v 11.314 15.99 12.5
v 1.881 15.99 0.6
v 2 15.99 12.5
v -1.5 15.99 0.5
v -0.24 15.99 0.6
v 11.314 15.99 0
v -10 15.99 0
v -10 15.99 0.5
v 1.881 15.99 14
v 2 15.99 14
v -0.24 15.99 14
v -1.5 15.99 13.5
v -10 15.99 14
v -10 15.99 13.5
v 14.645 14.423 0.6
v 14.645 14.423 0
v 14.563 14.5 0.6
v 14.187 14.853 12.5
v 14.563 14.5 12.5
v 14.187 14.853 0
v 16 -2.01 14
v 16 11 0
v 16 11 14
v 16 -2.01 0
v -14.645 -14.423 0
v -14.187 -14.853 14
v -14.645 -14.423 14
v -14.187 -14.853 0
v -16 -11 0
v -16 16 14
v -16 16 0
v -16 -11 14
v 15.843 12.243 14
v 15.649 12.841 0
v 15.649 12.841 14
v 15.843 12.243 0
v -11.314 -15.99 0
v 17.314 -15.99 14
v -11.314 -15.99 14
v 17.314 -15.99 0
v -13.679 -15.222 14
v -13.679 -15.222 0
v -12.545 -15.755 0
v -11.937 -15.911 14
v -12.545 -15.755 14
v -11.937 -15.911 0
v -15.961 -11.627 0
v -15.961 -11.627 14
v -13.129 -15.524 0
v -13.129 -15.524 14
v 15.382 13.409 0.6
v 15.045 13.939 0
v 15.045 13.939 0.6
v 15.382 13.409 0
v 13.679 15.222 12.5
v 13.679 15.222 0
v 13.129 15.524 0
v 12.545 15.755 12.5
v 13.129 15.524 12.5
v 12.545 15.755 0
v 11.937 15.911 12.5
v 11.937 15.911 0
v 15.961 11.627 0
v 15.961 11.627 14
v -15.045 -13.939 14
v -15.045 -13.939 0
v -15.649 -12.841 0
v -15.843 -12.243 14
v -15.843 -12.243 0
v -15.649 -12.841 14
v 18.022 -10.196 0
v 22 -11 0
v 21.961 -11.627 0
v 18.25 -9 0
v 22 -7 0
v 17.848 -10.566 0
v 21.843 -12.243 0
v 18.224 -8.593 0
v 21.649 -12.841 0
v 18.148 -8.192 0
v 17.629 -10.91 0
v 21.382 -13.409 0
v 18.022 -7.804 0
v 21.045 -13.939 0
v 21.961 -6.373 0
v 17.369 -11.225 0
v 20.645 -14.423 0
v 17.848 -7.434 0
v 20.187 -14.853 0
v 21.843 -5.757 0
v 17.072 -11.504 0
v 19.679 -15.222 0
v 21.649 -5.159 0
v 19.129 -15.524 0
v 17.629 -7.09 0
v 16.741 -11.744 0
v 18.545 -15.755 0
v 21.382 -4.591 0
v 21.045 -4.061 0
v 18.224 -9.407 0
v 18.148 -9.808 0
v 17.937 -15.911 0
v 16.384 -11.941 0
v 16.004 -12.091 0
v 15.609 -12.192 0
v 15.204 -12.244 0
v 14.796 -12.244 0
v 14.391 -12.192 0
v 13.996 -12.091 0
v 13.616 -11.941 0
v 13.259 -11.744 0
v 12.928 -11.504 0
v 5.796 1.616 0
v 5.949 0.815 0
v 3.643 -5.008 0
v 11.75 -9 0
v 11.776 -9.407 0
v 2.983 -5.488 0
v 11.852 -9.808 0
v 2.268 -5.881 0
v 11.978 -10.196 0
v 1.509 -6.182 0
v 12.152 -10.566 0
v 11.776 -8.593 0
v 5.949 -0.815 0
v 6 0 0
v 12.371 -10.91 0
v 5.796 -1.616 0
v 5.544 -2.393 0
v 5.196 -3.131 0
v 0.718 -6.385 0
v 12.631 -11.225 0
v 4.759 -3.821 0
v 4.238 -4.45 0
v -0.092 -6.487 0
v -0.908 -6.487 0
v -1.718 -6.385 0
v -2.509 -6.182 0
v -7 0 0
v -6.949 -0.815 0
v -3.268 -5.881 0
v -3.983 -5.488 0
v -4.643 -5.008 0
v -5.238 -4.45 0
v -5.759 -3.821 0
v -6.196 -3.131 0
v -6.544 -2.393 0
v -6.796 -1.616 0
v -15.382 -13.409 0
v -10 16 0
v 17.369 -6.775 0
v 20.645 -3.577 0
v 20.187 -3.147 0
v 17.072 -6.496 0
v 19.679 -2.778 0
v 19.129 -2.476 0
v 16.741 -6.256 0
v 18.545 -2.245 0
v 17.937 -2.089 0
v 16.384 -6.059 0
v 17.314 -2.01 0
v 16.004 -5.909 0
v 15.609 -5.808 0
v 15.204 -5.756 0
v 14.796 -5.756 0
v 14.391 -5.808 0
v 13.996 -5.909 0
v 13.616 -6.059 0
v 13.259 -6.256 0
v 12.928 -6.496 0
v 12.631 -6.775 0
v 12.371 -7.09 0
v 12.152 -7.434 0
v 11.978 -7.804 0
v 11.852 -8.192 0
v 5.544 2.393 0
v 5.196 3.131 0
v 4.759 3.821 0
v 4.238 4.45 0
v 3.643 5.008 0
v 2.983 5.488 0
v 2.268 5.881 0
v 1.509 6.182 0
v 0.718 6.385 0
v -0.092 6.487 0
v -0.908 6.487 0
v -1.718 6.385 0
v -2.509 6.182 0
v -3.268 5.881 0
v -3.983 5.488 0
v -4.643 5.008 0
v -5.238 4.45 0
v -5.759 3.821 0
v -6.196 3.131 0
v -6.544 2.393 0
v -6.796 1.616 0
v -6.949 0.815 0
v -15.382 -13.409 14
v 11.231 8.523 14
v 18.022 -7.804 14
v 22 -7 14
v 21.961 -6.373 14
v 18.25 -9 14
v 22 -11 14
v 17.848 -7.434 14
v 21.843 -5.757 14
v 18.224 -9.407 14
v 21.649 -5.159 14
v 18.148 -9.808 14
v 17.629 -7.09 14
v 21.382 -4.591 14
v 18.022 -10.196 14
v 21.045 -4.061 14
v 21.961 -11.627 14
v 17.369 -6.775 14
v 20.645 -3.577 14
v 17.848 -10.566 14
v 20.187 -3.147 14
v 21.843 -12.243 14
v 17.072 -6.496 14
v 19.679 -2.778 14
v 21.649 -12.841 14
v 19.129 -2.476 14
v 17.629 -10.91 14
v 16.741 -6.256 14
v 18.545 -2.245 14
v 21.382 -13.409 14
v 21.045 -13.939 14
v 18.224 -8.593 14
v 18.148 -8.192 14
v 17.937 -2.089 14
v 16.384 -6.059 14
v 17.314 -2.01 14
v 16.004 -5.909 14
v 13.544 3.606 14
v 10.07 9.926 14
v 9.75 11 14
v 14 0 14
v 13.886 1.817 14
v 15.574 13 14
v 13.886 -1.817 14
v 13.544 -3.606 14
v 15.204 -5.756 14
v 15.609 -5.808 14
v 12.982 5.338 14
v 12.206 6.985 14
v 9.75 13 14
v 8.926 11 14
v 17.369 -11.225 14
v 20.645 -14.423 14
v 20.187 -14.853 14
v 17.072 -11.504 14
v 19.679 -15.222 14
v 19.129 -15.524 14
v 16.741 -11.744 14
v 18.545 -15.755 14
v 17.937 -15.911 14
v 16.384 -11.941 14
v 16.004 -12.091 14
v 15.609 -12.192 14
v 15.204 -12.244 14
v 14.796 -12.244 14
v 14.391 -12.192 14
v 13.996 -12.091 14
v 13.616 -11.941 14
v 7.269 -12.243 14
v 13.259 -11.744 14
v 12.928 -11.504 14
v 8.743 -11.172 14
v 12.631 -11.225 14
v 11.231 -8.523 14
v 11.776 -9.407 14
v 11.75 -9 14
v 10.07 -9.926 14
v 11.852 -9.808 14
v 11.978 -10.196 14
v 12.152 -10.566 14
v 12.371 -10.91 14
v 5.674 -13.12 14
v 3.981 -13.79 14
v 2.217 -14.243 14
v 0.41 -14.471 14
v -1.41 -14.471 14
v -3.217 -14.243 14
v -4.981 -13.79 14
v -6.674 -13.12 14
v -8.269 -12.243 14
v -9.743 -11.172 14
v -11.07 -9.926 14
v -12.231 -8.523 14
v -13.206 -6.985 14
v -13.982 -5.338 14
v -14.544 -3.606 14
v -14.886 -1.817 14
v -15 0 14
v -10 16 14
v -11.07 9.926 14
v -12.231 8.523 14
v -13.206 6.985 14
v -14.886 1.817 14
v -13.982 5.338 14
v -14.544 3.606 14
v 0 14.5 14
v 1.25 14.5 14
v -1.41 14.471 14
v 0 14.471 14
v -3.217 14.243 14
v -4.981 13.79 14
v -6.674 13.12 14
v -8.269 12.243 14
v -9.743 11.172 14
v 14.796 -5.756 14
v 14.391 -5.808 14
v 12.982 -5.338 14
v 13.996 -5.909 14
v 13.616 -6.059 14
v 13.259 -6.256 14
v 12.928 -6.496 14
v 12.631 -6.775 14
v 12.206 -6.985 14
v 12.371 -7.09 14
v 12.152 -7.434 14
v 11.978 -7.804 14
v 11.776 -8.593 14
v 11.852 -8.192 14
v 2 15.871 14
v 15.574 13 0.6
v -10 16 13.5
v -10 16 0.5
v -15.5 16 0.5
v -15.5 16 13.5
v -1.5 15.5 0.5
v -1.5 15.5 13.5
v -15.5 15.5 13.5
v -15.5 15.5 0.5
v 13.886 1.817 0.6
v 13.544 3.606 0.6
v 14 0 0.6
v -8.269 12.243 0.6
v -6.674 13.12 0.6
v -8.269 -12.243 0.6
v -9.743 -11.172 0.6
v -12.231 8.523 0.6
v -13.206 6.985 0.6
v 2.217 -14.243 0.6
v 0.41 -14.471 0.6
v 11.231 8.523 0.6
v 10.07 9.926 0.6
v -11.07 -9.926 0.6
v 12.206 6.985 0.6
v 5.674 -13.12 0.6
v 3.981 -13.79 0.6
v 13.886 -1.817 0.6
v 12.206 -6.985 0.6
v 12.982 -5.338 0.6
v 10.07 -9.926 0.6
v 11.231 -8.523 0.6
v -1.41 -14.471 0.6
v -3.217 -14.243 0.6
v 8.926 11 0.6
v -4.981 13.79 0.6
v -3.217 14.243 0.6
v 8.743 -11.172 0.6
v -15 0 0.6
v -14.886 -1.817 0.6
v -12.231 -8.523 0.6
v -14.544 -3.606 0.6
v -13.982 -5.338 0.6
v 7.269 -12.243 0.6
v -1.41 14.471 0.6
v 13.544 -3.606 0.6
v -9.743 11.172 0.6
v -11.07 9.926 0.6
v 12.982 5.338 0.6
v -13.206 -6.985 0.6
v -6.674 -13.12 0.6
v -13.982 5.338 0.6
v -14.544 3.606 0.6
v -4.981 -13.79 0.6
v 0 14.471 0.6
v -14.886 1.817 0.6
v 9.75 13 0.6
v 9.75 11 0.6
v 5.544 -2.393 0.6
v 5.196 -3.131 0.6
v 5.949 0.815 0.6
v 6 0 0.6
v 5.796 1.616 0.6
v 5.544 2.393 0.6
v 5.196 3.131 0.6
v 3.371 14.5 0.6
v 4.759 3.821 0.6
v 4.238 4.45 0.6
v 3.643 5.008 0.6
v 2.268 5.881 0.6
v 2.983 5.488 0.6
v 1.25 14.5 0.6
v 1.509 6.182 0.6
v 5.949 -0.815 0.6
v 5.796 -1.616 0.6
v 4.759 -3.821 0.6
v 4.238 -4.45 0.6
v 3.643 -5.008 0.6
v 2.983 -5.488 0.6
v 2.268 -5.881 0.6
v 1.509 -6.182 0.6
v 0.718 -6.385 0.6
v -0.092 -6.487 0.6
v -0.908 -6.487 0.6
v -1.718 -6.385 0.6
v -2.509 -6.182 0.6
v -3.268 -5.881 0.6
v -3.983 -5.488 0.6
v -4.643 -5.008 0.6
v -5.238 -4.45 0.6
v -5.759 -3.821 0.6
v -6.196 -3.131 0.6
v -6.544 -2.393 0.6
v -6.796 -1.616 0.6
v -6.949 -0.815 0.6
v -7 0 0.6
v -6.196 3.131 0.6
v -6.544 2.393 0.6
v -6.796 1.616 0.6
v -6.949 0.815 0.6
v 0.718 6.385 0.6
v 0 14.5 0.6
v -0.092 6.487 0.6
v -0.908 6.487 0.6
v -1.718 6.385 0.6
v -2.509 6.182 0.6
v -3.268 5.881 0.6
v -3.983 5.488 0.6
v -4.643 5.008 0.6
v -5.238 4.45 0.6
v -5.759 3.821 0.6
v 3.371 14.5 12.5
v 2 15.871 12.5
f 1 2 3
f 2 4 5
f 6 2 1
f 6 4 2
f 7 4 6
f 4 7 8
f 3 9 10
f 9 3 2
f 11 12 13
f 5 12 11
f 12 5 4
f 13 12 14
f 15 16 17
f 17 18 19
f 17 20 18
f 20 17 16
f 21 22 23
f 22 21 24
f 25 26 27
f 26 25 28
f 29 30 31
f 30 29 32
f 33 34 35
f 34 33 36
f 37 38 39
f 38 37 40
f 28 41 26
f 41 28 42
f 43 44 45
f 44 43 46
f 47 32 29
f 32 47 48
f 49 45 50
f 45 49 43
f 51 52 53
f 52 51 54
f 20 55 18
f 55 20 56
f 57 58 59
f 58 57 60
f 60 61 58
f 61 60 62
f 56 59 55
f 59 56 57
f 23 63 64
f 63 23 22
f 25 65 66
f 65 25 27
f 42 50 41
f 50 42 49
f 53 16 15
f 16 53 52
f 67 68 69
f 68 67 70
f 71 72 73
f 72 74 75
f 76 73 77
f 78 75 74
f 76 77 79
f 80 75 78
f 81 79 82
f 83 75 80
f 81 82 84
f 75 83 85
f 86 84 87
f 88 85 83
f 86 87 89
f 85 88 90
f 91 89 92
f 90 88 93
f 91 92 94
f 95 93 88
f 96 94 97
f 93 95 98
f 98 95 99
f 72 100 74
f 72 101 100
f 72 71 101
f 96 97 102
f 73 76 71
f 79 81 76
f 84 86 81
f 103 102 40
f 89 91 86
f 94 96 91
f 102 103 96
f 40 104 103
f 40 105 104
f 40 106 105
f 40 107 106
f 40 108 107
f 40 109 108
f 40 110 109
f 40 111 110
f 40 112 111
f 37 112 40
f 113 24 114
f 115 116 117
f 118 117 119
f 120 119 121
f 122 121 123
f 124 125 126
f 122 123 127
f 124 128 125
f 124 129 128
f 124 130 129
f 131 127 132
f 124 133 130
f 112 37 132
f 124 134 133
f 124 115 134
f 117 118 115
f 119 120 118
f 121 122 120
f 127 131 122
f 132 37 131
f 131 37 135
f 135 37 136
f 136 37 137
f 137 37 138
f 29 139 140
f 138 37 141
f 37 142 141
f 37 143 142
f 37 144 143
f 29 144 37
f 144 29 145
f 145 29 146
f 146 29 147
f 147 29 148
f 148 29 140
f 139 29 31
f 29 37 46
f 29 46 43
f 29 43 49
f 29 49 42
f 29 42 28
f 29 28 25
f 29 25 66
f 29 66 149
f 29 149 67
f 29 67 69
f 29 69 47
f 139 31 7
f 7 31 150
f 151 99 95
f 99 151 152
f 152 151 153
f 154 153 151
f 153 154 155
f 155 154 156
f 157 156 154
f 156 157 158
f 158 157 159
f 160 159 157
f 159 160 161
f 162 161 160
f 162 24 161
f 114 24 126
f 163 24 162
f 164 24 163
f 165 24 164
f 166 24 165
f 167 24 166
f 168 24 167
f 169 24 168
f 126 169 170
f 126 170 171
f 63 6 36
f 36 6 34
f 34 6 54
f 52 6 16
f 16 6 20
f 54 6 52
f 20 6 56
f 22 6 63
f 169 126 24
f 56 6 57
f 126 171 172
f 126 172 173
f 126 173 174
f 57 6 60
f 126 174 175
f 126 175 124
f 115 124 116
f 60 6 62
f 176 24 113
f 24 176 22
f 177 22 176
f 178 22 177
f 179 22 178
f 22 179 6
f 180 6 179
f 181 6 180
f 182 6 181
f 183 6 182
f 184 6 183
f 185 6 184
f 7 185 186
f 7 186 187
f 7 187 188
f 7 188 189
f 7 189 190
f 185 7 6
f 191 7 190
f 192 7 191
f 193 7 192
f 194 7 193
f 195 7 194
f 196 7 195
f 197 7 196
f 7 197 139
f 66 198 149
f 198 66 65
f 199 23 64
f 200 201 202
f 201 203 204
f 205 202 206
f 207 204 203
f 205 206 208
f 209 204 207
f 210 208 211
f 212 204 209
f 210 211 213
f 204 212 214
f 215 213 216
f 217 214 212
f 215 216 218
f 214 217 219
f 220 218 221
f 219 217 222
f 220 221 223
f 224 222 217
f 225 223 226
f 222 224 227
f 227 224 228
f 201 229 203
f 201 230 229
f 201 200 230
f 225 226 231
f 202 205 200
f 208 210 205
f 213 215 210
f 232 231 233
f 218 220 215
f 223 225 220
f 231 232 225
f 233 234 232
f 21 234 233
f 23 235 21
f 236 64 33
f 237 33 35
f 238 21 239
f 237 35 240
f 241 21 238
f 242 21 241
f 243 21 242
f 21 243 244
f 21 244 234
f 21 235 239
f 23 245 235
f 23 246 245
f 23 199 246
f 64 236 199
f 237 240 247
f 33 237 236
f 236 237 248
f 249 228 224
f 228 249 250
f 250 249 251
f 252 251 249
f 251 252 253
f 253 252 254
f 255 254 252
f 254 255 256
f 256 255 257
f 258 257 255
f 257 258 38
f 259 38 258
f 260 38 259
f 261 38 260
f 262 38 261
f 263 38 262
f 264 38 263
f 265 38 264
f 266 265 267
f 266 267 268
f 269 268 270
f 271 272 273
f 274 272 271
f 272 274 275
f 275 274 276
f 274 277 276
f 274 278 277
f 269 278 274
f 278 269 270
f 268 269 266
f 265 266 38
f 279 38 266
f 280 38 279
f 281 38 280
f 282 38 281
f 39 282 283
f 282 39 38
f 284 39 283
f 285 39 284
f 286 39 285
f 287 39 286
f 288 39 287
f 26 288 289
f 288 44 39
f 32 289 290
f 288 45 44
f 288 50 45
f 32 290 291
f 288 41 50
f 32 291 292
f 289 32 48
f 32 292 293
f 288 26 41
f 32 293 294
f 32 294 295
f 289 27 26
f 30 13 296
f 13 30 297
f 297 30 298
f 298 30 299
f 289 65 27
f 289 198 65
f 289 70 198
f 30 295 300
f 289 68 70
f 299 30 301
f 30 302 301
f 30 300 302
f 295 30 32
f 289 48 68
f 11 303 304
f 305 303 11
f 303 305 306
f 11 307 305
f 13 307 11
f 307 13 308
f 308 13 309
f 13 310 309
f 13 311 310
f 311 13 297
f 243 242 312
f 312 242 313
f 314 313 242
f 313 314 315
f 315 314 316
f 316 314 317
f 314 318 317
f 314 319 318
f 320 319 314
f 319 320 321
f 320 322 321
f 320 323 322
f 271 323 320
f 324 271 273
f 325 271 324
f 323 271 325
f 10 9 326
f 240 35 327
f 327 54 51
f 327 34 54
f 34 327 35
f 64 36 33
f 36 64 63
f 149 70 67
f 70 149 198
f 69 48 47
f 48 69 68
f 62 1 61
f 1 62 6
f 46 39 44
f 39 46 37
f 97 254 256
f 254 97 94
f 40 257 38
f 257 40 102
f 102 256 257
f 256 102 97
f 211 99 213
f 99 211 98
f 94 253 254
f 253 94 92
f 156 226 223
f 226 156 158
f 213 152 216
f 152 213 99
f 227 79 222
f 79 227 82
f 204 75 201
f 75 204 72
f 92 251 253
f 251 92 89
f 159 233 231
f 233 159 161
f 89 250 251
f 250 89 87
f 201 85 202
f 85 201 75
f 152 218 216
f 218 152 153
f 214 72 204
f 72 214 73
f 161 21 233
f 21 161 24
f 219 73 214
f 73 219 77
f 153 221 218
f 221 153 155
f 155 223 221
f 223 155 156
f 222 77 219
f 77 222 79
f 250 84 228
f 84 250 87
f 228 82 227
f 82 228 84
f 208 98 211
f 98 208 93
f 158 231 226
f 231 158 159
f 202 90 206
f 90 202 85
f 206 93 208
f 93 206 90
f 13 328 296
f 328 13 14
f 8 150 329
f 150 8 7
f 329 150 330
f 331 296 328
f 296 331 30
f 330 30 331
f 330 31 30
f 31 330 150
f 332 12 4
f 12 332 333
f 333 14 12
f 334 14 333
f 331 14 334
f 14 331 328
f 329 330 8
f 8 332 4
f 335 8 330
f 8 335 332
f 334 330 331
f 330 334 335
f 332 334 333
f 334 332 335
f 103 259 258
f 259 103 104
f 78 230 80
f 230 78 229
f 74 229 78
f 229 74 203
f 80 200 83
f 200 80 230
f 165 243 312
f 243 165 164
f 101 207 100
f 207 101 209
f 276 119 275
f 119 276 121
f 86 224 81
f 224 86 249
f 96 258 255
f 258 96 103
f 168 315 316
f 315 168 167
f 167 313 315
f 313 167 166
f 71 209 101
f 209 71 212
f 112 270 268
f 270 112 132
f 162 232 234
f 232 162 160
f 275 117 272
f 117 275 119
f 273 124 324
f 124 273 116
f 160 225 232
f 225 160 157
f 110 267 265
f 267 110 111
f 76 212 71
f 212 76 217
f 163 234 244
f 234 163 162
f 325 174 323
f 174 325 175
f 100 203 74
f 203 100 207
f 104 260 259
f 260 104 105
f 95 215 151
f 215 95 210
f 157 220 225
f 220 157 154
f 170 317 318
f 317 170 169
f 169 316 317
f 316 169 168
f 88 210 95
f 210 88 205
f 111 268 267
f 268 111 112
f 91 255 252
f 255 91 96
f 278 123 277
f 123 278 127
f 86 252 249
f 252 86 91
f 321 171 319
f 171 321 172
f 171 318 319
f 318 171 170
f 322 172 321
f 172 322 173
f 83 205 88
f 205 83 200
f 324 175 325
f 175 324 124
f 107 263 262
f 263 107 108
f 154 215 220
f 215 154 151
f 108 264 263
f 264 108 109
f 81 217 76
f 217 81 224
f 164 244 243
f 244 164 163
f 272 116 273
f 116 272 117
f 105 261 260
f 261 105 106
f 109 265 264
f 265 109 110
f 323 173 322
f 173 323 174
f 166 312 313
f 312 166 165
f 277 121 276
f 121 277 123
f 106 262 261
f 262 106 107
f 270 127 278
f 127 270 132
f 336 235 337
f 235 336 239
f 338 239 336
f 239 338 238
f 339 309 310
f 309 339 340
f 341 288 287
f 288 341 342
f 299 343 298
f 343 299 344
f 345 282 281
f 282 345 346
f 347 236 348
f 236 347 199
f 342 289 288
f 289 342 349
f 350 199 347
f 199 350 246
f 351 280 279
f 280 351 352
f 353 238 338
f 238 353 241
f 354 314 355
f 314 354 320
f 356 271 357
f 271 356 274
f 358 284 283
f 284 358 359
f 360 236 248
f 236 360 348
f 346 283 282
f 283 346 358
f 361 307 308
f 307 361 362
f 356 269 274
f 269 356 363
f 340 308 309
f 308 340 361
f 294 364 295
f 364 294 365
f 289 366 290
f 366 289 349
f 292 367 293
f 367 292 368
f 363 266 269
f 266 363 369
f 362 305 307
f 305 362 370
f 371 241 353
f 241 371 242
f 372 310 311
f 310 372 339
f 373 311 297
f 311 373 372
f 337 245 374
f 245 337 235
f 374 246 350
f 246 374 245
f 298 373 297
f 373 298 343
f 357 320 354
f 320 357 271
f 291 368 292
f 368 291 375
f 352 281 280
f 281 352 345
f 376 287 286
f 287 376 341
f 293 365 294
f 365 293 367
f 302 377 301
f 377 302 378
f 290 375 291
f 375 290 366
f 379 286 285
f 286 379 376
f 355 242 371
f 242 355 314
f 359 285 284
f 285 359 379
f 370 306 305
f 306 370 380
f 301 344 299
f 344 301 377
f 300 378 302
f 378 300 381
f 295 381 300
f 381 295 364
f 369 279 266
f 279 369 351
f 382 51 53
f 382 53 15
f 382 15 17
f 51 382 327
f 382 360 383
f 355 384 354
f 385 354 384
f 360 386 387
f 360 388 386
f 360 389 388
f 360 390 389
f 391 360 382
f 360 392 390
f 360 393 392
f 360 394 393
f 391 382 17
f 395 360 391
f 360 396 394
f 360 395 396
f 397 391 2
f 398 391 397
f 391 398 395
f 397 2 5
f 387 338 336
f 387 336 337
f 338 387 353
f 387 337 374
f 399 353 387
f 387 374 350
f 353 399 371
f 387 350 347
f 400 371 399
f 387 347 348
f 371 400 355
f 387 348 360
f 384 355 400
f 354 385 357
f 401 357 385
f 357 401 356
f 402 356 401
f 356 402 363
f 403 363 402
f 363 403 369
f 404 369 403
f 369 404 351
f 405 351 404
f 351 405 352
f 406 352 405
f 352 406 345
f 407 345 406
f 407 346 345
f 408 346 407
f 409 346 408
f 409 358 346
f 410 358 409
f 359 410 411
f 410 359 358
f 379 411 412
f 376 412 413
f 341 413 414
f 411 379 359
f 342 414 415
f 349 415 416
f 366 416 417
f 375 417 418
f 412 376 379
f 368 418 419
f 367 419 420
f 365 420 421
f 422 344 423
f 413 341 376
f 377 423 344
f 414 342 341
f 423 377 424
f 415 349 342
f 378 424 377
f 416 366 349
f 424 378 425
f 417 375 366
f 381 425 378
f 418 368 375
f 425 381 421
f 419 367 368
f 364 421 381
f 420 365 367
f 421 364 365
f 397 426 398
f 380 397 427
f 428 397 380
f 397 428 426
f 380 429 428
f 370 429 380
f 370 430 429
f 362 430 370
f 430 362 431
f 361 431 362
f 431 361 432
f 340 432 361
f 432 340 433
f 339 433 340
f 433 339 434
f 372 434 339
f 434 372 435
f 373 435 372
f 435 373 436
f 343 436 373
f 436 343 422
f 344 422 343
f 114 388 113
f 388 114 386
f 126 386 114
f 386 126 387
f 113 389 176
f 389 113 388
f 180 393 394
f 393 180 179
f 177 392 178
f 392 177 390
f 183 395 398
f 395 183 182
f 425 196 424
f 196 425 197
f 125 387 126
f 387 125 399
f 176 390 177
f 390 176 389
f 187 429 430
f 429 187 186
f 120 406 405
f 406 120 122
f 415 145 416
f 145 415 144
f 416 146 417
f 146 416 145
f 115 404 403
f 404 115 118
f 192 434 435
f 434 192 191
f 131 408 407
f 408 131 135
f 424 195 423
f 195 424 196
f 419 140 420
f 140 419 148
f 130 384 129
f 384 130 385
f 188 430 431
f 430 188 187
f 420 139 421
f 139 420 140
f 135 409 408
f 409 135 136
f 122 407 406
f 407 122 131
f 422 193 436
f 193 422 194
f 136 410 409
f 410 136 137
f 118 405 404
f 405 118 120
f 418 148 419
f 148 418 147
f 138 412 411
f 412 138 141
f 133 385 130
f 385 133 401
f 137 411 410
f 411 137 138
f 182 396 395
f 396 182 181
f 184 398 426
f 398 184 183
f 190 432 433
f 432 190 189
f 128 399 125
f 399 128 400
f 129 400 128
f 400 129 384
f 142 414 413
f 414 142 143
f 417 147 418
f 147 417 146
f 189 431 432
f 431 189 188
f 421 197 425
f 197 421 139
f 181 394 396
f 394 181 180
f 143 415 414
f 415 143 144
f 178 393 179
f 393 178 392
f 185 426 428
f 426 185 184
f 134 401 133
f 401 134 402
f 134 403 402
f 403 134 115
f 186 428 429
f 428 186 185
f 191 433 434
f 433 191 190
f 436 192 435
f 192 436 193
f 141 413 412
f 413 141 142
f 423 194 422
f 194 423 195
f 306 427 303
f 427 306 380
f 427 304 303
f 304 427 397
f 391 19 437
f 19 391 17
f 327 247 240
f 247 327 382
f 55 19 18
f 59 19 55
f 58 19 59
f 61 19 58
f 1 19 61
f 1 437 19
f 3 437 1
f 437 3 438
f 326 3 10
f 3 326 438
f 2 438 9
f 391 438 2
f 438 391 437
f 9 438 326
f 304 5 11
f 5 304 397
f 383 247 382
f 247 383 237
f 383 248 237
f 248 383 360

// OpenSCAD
$fn = 50;


difference() {
	union() {
		hull() {
			translate(v = [-11.0000000000, 11.0000000000, 0]) {
				cylinder(h = 14, r = 5);
			}
			translate(v = [11.0000000000, 11.0000000000, 0]) {
				cylinder(h = 14, r = 5);
			}
			translate(v = [-11.0000000000, -11.0000000000, 0]) {
				cylinder(h = 14, r = 5);
			}
			translate(v = [11.0000000000, -11.0000000000, 0]) {
				cylinder(h = 14, r = 5);
			}
		}
		translate(v = [7.5000000000, -9.0000000000, 0]) {
			hull() {
				translate(v = [-9.5000000000, 2.0000000000, 0]) {
					cylinder(h = 14, r = 5);
				}
				translate(v = [9.5000000000, 2.0000000000, 0]) {
					cylinder(h = 14, r = 5);
				}
				translate(v = [-9.5000000000, -2.0000000000, 0]) {
					cylinder(h = 14, r = 5);
				}
				translate(v = [9.5000000000, -2.0000000000, 0]) {
					cylinder(h = 14, r = 5);
				}
			}
		}
		translate(v = [-16.0000000000, 10.0000000000, 0]) {
			cube(size = [6, 6, 14]);
		}
	}
	union() {
		translate(v = [-15.5000000000, 15.5000000000, 0.5000000000]) {
			cube(size = [14, 0.5000000000, 13.0000000000]);
		}
		translate(v = [15.0000000000, -9.0000000000, -50.0000000000]) {
			cylinder(h = 100, r = 3.2500000000);
		}
		translate(v = [-0.5000000000, 0.0000000000, 0.6000000000]) {
			cylinder(h = 16.4000000000, r = 14.5000000000);
		}
		translate(v = [-0.5000000000, 0.0000000000, -7.0000000000]) {
			cylinder(h = 14, r = 6.5000000000);
		}
		translate(v = [0.0000000000, 13.0000000000, 0.6000000000]) {
			cube(size = [16.0000000000, 1.5000000000, 16.4000000000]);
		}
		translate(v = [2.0000000000, 13.0000000000, 12.5000000000]) {
			cube(size = [14.0000000000, 4.5000000000, 1.5000000000]);
		}
		translate(v = [-3.0000000000, 18.7500000000, 0.6000000000]) {
			rotate(a = [0, 0, -45]) {
				cube(size = [10, 1.5000000000, 16.4000000000]);
			}
		}
		translate(v = [2.2500000000, 11.0000000000, 0.6000000000]) {
			cube(size = [7.5000000000, 2, 13.4000000000]);
		}
	}
}
